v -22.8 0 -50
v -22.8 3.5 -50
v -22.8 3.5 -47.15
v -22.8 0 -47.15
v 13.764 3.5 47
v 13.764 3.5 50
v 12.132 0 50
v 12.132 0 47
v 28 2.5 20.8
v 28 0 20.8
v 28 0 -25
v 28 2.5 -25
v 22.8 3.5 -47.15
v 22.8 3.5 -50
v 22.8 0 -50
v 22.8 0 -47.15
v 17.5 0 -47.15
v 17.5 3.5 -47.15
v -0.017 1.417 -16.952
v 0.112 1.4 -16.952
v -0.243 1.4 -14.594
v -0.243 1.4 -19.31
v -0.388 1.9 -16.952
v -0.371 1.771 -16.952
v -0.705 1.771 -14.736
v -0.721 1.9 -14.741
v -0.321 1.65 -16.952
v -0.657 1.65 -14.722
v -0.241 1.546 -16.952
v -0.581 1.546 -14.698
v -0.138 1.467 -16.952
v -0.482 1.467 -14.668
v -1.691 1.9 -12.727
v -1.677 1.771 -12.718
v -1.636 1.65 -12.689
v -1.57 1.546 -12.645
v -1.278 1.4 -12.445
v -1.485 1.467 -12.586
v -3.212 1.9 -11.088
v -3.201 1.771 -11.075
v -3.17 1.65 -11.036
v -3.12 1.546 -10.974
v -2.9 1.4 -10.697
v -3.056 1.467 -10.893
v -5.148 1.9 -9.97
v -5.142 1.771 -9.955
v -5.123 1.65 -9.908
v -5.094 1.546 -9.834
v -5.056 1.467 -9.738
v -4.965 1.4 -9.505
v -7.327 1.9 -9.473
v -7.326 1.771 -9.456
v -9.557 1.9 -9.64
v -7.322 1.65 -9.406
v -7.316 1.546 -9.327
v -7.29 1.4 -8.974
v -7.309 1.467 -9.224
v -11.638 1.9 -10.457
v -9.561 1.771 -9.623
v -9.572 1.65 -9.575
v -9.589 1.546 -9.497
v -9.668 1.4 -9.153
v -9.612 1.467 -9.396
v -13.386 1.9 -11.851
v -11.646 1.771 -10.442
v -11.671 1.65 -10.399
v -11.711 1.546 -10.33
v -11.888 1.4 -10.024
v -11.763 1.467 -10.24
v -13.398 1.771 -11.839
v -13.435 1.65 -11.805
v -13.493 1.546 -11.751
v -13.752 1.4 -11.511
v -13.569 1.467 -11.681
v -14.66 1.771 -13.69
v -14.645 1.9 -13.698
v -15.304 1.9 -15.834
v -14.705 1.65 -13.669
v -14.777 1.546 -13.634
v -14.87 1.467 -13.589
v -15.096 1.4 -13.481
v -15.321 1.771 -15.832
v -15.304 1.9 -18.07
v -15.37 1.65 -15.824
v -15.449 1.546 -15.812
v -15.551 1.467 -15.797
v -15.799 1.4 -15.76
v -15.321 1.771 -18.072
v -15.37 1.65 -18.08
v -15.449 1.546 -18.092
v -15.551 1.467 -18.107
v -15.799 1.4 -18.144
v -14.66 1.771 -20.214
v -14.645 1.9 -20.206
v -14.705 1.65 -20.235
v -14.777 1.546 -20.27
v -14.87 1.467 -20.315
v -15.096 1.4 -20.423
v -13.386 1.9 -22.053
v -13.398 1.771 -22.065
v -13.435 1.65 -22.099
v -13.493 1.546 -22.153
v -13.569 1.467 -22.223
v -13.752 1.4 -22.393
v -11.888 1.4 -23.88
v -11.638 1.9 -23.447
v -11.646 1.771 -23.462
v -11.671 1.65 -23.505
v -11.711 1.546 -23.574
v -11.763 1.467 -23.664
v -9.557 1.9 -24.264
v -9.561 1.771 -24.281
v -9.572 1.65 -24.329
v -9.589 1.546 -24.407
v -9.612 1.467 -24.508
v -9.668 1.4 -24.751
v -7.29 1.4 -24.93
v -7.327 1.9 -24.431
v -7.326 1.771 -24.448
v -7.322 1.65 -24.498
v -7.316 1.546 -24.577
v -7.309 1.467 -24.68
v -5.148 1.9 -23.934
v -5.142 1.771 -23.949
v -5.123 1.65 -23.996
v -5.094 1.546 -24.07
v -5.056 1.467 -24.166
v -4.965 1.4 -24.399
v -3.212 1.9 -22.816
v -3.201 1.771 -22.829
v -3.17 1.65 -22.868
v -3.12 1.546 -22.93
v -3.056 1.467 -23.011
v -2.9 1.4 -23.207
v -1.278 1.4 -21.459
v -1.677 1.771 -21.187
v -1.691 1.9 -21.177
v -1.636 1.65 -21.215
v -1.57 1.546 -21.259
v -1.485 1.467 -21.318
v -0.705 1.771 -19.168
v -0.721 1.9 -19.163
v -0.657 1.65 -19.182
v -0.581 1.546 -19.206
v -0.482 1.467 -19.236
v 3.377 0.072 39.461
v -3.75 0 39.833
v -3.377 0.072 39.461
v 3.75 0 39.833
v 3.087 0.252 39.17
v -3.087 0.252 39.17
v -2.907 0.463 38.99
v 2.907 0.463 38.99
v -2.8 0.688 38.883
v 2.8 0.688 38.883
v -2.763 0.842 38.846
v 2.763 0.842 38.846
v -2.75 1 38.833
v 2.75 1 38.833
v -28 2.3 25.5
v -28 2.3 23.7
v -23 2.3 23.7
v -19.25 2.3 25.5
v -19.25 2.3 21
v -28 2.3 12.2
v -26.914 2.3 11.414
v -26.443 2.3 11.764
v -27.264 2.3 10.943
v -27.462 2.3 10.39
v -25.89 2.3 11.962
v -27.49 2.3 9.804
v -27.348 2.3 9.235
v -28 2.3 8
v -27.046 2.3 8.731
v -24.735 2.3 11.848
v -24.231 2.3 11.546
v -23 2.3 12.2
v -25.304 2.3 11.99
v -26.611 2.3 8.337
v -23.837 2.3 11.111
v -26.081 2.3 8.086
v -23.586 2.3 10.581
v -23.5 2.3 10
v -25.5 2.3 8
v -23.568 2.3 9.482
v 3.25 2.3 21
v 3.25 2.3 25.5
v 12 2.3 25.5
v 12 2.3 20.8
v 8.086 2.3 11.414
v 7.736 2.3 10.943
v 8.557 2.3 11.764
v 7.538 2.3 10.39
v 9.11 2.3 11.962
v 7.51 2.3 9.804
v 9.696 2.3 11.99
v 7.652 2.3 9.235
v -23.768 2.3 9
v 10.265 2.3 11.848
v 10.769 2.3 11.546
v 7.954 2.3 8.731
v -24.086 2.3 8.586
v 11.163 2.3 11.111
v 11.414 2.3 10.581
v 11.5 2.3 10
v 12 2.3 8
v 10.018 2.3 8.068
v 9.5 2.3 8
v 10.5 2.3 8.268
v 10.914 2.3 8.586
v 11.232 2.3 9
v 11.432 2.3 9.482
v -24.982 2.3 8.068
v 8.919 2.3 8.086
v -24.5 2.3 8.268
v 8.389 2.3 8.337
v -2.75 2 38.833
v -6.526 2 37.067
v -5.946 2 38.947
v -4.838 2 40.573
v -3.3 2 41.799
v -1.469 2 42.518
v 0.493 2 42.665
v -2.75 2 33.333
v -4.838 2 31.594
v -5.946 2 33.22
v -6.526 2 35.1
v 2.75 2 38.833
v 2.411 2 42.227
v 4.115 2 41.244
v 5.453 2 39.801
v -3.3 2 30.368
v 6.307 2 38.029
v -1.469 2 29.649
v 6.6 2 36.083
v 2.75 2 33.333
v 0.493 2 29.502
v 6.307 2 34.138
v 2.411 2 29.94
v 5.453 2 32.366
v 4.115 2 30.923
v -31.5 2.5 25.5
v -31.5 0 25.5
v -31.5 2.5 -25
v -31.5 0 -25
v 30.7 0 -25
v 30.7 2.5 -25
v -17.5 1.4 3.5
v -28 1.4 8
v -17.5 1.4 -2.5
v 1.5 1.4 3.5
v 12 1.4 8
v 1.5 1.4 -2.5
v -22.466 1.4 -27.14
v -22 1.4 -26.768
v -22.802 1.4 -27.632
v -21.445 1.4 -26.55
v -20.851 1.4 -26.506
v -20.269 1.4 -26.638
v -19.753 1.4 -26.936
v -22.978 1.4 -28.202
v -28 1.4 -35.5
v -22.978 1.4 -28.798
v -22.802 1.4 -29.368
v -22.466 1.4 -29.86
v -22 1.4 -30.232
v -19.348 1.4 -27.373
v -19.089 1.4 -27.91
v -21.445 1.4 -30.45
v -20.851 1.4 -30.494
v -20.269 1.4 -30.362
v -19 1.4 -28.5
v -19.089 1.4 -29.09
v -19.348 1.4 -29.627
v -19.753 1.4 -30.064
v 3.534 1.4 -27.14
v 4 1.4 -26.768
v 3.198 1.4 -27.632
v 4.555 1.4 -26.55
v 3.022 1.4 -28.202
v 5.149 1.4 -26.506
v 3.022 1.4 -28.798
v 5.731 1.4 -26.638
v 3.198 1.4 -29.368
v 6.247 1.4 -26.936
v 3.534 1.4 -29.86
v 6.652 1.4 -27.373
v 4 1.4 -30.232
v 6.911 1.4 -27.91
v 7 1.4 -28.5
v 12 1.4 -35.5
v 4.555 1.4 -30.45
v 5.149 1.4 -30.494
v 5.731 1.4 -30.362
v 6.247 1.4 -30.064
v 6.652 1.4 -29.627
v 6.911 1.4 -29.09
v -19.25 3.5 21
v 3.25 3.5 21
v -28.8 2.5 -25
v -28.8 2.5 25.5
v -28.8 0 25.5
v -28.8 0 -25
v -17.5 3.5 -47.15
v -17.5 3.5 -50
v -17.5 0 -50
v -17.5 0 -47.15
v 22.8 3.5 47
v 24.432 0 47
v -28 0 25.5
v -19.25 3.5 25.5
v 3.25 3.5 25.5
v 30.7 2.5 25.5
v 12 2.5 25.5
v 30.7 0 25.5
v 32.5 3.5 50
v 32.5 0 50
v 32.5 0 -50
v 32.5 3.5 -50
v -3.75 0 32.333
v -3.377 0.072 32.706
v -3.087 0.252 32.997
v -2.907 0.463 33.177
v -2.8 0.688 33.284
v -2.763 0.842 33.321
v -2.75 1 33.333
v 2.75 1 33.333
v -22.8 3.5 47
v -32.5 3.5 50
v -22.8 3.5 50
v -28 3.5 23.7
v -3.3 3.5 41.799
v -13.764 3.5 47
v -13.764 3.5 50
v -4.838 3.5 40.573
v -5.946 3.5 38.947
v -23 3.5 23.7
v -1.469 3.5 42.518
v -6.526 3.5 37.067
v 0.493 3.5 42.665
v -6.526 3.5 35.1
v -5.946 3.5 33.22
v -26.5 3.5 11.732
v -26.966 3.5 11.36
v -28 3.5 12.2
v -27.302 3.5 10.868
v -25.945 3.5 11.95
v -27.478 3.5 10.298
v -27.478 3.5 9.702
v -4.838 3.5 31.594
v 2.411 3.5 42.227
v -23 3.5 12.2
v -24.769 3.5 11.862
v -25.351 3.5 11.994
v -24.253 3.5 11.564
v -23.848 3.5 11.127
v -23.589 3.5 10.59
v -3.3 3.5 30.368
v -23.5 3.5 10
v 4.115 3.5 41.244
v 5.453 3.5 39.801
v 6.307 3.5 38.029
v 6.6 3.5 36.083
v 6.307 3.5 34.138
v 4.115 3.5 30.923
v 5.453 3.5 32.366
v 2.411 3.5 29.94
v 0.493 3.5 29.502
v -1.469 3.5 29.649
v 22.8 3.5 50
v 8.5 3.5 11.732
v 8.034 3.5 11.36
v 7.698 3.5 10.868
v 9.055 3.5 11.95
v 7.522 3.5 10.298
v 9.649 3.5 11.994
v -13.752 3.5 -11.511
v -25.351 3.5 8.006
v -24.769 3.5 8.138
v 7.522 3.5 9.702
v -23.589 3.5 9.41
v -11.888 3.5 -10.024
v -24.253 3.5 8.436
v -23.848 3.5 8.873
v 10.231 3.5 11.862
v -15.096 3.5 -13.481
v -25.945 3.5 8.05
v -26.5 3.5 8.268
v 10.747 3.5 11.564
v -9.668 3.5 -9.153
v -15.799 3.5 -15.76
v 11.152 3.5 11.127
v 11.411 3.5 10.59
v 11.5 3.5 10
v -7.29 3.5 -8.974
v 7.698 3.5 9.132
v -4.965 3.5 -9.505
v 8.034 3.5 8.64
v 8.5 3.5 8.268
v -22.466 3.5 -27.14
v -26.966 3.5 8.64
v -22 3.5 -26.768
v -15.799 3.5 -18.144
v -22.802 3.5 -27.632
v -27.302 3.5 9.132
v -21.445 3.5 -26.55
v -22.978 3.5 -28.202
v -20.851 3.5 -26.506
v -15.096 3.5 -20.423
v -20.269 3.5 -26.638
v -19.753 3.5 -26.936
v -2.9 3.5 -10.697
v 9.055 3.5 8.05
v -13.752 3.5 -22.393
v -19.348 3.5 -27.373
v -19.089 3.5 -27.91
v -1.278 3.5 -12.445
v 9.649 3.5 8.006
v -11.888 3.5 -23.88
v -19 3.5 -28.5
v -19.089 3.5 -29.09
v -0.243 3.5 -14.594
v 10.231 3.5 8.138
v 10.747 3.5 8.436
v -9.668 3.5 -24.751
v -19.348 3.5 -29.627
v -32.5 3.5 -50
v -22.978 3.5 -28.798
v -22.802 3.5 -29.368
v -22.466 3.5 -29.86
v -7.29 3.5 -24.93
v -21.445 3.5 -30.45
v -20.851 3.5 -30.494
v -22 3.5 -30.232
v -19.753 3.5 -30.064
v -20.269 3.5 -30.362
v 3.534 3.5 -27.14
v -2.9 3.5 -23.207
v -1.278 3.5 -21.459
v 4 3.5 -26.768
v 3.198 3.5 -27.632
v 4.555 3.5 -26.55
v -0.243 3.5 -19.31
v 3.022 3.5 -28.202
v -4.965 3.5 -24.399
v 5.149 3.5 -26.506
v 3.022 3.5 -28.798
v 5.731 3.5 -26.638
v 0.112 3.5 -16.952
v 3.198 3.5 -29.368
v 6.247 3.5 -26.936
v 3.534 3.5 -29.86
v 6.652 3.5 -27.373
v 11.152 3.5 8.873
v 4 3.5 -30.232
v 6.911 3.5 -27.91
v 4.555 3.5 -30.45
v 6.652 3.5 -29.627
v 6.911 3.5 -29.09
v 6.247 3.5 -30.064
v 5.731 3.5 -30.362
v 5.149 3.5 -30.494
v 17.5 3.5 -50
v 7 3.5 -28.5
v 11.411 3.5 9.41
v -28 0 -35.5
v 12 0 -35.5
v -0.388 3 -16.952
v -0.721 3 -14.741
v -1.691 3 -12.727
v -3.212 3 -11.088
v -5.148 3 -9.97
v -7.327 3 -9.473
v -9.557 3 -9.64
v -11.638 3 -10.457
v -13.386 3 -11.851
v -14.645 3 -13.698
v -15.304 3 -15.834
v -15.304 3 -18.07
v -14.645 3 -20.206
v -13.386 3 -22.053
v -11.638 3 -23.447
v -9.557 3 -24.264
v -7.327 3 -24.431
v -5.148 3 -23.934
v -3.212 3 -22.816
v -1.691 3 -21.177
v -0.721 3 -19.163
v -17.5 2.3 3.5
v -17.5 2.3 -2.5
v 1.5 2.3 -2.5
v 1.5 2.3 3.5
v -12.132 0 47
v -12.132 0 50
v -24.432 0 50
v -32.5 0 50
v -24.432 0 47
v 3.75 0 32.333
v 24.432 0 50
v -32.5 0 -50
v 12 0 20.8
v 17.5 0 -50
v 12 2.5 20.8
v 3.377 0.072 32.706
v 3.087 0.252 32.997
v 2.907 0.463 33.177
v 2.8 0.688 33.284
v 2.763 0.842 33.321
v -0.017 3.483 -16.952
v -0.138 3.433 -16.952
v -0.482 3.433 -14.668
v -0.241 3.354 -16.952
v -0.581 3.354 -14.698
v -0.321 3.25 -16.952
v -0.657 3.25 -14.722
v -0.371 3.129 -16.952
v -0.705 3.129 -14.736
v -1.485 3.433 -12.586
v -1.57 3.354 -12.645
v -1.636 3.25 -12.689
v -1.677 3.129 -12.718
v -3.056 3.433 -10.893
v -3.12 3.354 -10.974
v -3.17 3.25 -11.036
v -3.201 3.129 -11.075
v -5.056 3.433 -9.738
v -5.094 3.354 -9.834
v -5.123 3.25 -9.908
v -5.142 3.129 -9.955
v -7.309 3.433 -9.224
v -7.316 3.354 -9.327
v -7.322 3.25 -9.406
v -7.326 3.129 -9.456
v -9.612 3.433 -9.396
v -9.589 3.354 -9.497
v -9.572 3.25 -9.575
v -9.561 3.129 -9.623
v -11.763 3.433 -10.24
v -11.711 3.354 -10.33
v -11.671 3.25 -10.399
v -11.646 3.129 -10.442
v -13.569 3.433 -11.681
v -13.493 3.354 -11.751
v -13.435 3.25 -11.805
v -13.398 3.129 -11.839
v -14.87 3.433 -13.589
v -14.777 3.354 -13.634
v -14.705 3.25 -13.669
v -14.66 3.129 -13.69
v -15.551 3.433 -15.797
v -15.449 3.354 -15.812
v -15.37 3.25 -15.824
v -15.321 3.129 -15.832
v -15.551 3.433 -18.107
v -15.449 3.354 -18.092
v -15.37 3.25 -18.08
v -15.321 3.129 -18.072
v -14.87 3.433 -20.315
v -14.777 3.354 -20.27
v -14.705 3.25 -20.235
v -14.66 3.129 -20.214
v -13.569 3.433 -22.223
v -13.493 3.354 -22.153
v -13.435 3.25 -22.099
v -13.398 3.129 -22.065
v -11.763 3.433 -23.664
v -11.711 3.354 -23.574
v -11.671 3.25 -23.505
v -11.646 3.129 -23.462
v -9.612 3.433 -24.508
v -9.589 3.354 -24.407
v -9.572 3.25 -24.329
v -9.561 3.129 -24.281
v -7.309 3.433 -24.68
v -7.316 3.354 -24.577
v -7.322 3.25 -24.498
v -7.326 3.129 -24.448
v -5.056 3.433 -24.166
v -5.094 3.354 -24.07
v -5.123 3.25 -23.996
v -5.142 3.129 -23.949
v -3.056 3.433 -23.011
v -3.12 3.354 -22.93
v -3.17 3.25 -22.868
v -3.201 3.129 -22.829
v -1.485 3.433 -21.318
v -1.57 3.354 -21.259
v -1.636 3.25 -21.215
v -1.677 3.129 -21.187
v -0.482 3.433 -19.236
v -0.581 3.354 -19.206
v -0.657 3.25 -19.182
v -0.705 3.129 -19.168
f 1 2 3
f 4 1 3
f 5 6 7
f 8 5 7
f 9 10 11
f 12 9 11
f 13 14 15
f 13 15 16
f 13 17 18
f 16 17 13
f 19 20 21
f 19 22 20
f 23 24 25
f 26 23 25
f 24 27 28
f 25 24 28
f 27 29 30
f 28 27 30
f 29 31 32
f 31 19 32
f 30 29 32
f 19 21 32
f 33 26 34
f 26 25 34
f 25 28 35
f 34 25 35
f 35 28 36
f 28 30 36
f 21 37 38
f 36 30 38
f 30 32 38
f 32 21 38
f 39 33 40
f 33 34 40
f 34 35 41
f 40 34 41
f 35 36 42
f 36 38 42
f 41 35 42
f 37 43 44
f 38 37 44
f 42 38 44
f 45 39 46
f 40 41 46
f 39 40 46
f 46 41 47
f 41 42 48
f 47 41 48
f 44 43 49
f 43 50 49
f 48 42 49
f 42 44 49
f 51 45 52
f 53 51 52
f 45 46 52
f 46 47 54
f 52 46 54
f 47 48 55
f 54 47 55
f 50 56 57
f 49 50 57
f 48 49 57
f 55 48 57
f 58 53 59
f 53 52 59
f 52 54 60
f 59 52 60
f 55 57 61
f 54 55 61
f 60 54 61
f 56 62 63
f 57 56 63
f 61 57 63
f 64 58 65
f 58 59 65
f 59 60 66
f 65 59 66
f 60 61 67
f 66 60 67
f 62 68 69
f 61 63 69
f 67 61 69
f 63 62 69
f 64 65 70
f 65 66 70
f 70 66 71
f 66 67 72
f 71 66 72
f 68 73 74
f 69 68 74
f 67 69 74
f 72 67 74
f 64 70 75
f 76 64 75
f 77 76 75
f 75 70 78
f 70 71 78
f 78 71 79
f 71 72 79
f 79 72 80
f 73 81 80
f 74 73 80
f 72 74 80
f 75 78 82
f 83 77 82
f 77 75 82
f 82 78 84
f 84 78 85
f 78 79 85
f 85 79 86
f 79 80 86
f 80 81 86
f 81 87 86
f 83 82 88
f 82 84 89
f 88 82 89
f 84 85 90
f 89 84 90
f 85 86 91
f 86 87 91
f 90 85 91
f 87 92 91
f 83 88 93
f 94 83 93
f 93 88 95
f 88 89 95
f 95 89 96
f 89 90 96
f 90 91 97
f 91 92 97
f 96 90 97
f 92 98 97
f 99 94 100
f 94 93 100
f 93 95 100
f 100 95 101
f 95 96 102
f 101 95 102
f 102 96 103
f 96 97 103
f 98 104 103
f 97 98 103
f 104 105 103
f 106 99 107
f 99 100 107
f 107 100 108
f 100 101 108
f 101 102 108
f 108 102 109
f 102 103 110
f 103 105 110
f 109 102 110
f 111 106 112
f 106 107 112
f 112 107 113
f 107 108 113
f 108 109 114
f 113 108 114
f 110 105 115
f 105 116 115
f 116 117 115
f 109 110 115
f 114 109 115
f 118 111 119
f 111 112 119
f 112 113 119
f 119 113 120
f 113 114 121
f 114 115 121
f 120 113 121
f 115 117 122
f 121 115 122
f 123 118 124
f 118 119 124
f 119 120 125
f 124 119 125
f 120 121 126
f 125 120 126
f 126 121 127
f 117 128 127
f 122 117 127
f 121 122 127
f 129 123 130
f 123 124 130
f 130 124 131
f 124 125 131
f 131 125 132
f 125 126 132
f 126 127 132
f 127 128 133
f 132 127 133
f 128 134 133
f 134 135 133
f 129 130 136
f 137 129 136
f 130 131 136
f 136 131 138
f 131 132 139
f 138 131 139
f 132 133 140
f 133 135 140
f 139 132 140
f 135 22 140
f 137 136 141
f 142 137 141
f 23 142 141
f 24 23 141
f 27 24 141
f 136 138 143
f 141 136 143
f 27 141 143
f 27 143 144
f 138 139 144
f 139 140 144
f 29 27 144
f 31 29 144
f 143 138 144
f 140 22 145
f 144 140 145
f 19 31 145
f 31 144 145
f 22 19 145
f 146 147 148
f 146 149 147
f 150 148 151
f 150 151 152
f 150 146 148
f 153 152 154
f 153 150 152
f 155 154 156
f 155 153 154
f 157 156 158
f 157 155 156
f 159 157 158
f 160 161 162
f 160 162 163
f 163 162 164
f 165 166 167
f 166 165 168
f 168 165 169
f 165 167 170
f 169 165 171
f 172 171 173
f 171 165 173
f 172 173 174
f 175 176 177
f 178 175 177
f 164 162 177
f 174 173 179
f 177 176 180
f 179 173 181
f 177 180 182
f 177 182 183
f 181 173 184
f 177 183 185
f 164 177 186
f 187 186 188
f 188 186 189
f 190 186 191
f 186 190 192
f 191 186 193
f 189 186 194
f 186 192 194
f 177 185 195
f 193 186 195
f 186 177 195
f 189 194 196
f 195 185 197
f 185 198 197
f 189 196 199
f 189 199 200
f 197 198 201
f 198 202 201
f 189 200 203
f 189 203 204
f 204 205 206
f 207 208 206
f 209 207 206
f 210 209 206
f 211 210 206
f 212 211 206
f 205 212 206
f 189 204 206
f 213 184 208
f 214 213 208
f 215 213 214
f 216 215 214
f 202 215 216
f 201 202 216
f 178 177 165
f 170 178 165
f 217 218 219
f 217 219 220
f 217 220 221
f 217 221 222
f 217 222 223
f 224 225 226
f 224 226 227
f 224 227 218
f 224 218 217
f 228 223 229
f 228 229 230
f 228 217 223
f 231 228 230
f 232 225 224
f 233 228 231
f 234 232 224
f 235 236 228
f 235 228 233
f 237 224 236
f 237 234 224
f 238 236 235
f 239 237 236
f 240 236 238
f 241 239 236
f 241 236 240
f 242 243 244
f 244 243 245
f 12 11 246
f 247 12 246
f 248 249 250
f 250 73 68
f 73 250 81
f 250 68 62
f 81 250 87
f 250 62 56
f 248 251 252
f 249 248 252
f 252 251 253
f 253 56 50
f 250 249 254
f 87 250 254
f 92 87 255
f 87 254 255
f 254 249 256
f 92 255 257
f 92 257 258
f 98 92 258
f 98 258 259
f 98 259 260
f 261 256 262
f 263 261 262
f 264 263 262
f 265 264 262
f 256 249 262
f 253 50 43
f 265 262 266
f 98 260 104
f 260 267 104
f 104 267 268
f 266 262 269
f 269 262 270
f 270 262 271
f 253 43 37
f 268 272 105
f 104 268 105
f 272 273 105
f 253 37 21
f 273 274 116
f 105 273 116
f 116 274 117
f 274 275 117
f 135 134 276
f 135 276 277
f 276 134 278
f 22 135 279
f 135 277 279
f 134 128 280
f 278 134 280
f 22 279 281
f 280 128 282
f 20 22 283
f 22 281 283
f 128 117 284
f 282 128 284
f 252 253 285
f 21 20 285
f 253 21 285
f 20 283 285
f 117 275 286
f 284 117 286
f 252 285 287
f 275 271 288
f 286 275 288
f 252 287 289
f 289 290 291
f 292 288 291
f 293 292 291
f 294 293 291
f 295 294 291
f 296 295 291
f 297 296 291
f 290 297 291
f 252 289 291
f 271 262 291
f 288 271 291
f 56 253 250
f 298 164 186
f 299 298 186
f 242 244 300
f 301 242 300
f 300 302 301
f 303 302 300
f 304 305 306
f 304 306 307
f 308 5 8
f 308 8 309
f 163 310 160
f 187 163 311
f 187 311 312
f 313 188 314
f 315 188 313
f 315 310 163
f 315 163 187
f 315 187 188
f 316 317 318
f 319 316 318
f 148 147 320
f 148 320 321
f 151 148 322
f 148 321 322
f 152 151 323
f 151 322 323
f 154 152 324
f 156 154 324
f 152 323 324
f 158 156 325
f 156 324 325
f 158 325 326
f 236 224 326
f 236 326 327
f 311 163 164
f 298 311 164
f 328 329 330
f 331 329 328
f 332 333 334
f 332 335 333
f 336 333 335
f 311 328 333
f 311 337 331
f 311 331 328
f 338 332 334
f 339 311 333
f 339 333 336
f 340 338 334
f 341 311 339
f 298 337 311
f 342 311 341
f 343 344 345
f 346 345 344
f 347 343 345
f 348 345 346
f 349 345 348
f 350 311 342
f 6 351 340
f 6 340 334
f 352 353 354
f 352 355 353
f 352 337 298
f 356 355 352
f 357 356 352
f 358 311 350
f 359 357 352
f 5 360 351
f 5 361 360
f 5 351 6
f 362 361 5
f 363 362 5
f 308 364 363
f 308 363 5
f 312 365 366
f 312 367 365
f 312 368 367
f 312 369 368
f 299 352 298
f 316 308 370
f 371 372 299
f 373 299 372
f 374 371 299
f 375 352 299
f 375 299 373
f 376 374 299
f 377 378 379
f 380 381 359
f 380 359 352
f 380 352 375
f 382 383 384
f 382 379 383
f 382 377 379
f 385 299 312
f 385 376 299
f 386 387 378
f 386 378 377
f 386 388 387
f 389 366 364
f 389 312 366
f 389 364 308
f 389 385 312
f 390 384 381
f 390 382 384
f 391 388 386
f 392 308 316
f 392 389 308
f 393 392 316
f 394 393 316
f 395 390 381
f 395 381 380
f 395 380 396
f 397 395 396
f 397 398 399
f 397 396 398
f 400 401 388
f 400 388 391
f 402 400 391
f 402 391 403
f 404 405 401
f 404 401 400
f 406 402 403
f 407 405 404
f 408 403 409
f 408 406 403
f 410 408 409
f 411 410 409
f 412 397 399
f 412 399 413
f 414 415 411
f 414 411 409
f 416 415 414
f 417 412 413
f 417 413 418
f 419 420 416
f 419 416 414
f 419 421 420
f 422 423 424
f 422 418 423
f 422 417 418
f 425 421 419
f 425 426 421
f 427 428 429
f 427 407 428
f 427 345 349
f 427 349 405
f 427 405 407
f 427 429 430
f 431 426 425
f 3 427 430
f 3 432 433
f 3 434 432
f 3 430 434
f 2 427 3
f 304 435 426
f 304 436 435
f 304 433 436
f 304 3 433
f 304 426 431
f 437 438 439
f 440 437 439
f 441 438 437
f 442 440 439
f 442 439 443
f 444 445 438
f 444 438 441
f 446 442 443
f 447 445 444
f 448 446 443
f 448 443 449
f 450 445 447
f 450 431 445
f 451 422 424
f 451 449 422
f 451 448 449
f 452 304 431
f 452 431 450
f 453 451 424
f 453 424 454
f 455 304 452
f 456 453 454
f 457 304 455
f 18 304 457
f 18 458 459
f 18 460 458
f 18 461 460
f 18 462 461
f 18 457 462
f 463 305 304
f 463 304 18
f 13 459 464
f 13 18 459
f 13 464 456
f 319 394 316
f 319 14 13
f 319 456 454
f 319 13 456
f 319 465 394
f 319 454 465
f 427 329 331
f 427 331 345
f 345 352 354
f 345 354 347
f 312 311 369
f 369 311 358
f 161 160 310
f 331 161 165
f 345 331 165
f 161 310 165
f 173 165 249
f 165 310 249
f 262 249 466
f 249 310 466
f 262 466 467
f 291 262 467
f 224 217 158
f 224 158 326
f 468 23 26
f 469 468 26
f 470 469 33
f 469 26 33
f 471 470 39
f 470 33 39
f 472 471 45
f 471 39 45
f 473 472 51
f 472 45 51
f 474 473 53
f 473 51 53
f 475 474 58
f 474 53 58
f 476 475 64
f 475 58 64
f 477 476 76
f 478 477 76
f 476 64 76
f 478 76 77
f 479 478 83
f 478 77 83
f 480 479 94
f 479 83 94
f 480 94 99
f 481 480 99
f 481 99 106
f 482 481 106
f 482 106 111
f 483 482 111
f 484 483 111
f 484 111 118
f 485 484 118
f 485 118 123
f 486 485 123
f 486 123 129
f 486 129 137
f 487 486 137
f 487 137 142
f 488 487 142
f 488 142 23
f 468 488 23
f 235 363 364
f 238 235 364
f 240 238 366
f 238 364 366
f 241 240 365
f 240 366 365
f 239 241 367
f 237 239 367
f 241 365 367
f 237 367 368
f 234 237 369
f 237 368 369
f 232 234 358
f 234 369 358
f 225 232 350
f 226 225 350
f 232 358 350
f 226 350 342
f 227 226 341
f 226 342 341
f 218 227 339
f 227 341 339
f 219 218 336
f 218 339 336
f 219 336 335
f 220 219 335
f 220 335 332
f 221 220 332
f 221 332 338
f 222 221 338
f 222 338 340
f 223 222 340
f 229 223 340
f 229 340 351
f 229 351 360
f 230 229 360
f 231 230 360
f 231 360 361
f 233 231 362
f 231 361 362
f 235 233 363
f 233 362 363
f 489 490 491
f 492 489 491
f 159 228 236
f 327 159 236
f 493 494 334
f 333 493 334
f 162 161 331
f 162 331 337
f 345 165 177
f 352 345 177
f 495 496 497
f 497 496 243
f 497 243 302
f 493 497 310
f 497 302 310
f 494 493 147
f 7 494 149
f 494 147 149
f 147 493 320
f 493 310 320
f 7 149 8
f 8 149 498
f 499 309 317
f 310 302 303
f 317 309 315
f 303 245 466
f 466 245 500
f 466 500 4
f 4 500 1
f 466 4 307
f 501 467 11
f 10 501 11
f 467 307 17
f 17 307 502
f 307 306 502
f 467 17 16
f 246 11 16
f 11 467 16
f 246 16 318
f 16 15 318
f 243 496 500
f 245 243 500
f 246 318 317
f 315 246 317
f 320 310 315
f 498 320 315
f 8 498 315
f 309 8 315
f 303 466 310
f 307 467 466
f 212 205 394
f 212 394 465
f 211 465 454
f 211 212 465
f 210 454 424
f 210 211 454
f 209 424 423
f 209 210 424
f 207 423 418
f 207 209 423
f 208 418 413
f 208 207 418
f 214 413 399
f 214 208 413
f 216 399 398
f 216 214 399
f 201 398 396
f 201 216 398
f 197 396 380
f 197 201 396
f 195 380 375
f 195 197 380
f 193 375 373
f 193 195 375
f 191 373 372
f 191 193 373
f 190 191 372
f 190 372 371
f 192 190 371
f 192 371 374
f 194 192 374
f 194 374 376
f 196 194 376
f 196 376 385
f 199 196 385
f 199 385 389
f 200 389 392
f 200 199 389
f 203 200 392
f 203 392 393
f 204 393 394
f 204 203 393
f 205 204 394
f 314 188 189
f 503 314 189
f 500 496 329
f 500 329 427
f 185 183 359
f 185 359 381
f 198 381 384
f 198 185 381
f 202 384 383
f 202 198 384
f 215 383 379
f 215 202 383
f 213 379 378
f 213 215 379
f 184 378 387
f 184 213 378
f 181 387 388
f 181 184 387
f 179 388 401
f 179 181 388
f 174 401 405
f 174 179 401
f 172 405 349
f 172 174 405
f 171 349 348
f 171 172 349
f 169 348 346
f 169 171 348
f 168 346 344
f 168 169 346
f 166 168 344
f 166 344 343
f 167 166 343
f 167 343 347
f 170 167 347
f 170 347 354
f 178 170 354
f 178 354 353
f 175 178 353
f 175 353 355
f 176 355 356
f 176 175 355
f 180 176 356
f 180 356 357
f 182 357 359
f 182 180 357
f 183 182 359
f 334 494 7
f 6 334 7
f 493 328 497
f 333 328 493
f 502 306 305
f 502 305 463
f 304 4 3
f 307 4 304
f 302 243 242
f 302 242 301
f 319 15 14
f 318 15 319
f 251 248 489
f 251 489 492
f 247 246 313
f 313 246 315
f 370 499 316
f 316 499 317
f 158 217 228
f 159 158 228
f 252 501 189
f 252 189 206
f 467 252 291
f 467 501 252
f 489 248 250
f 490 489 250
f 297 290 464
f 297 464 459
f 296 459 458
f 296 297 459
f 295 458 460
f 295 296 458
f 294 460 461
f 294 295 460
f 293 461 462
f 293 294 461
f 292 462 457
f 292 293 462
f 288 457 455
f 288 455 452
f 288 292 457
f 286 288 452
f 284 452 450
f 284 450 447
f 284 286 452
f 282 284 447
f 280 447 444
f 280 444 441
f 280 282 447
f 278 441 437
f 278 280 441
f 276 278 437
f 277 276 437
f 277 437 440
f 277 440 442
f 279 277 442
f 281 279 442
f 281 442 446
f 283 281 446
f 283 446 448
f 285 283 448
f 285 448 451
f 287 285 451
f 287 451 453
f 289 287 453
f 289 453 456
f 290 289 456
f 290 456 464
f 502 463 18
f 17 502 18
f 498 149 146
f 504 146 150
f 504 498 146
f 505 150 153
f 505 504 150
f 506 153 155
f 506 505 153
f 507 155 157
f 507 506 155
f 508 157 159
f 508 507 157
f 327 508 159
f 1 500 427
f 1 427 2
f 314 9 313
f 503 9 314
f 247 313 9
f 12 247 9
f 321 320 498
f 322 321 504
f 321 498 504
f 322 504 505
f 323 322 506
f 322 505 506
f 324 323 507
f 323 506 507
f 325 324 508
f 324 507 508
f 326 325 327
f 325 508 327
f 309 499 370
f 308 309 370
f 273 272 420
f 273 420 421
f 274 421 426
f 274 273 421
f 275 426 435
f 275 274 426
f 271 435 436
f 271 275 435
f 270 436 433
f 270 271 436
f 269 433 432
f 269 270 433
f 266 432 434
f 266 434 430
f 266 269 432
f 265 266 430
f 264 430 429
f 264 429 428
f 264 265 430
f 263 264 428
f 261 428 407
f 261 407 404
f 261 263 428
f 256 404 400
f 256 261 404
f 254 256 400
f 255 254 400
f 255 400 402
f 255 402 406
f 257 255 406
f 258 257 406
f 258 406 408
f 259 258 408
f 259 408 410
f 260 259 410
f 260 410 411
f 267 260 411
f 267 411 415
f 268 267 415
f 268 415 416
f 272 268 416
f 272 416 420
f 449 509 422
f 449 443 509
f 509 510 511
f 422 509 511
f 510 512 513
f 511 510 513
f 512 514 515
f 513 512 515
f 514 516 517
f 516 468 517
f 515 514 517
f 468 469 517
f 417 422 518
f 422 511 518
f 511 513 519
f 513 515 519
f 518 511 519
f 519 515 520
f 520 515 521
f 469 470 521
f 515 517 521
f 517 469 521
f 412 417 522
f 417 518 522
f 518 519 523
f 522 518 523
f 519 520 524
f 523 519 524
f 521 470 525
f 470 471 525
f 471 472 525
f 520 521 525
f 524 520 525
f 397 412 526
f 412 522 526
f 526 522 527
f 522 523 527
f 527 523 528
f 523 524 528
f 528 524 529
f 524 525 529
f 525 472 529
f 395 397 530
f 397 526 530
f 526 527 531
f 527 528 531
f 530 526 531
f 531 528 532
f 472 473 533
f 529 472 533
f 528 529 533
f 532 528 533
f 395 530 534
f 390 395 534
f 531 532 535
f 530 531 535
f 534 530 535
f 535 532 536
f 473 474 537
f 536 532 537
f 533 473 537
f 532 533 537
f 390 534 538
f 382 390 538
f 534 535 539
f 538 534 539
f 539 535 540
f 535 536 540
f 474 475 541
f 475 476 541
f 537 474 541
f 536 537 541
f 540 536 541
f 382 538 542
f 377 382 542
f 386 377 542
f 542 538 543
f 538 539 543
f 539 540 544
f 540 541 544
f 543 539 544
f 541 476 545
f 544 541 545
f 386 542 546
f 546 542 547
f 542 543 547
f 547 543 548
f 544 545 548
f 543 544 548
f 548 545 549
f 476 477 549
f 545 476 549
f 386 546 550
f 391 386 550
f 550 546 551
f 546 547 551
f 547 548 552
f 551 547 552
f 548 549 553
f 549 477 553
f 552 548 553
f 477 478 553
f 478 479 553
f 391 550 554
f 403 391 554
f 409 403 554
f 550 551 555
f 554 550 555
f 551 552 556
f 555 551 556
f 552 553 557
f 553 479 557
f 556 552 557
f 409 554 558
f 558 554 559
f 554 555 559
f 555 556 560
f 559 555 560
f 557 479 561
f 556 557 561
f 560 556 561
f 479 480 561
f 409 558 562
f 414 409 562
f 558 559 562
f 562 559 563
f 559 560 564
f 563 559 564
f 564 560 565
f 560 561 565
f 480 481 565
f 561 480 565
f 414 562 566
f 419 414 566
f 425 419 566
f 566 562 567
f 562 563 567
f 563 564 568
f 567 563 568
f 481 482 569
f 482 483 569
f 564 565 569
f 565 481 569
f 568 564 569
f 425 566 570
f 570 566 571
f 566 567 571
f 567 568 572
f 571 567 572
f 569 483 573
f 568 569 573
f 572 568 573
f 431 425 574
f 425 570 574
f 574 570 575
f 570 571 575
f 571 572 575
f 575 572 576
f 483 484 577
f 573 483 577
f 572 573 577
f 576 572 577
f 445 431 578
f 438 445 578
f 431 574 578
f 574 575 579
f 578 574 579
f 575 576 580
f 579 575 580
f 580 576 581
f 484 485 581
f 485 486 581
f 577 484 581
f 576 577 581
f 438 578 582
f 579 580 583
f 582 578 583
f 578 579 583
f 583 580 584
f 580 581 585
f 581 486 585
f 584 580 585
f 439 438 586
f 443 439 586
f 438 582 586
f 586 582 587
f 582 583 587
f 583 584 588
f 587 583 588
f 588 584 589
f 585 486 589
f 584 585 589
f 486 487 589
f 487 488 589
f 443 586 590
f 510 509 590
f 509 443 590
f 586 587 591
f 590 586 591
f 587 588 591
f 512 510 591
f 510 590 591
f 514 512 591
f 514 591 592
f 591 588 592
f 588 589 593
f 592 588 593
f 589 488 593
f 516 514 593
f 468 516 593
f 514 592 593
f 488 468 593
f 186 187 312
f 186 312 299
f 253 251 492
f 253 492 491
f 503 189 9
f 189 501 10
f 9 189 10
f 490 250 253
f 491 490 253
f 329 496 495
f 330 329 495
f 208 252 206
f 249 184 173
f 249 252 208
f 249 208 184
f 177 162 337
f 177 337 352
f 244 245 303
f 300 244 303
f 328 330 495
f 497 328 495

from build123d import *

# Parameters (mm, degrees)
SKETCH1_W                = 65
SKETCH1_H                = 100
BOSS_EXTRUDE1_DEPTH      = 3.5
SKETCH2_W                = 40
SKETCH2_H                = 61
CUT_EXTRUDE1_DEPTH       = 1.4
SKETCH3_R                = 2
CUT_EXTRUDE3_DEPTH       = 3.5
SKETCH4_R                = 2
CUT_EXTRUDE5_DEPTH       = 3.5
SKETCH6_R                = 2
CUT_EXTRUDE6_DEPTH       = 3.5
SKETCH7_R                = 2
CUT_EXTRUDE7_DEPTH       = 3.5
SKETCH9_W                = 19
SKETCH9_H                = 6
CUT_EXTRUDE9_DEPTH       = 2.3
SKETCH10_W               = 22.5
SKETCH10_H               = 4.5
CUT_EXTRUDE10_DEPTH      = 3.5
CUT_EXTRUDE11_DEPTH      = 2.3
CUT_EXTRUDE15_DEPTH      = 2.5
SKETCH18_W               = 2.7
SKETCH18_H               = 50.5
CUT_EXTRUDE18_DEPTH      = 2.5
SKETCH8_W                = 5
SKETCH8_H                = 11.5
CUT_EXTRUDE25_DEPTH      = 3.5
SKETCH20_R               = 7.5
CUT_EXTRUDE27_DEPTH      = 2.4
CUT_EXTRUDE27_DEPTH_BACK = 3.1
SKETCH21_W               = 5.3
SKETCH21_H               = 2.85
CUT_EXTRUDE28_DEPTH      = 3.5
CUT_EXTRUDE30_DEPTH      = 3
FILLET2_R                = 0.5
SKETCH27_R               = 6.6
CUT_EXTRUDE32_DEPTH      = 1.5
SKETCH28_W               = 5.5
SKETCH28_H               = 5.5
CUT_EXTRUDE33_DEPTH      = 3
FILLET4_R                = 1


with BuildPart() as part:
    # Sketch1 → Boss-Extrude1 (new body)
    with BuildSketch(Plane(origin=(0, 0, 0), x_dir=(1, 0, 0), z_dir=(0, 1, 0))):
        Rectangle(SKETCH1_W, SKETCH1_H)
    extrude(amount=BOSS_EXTRUDE1_DEPTH)

    # Sketch2 → Cut-Extrude1 (cut)
    with BuildSketch(Plane(origin=(0, 0, 0), x_dir=(1, 0, 0), z_dir=(0, 1, 0))):
        with Locations((-8, 5)):
            Rectangle(SKETCH2_W, SKETCH2_H)
    extrude(amount=CUT_EXTRUDE1_DEPTH, mode=Mode.SUBTRACT)

    # Sketch3 → Cut-Extrude3 (cut)
    with BuildSketch(Plane(origin=(0, 0, 0), x_dir=(1, 0, 0), z_dir=(0, 1, 0))):
        with Locations((-21, 28.5)):
            Circle(SKETCH3_R)
    extrude(amount=CUT_EXTRUDE3_DEPTH, mode=Mode.SUBTRACT)

    # Sketch4 → Cut-Extrude5 (cut)
    with BuildSketch(Plane(origin=(0, 0, 0), x_dir=(1, 0, 0), z_dir=(0, 1, 0))):
        with Locations((5, 28.5)):
            Circle(SKETCH4_R)
    extrude(amount=CUT_EXTRUDE5_DEPTH, mode=Mode.SUBTRACT)

    # Sketch6 → Cut-Extrude6 (cut)
    with BuildSketch(Plane(origin=(0, 0, 0), x_dir=(1, 0, 0), z_dir=(0, 1, 0))):
        with Locations((-25.5, -10)):
            Circle(SKETCH6_R)
    extrude(amount=CUT_EXTRUDE6_DEPTH, mode=Mode.SUBTRACT)

    # Sketch7 → Cut-Extrude7 (cut)
    with BuildSketch(Plane(origin=(0, 0, 0), x_dir=(1, 0, 0), z_dir=(0, 1, 0))):
        with Locations((9.5, -10)):
            Circle(SKETCH7_R)
    extrude(amount=CUT_EXTRUDE7_DEPTH, mode=Mode.SUBTRACT)

    # Sketch9 → Cut-Extrude9 (cut)
    with BuildSketch(Plane(origin=(0, 0, 0), x_dir=(1, 0, 0), z_dir=(0, 1, 0))):
        with Locations((-8, -0.5)):
            Rectangle(SKETCH9_W, SKETCH9_H)
    extrude(amount=CUT_EXTRUDE9_DEPTH, mode=Mode.SUBTRACT)

    # Sketch10 → Cut-Extrude10 (cut)
    with BuildSketch(Plane(origin=(0, 0, 0), x_dir=(1, 0, 0), z_dir=(0, 1, 0))):
        with Locations((-8, -23.25)):
            Rectangle(SKETCH10_W, SKETCH10_H)
    extrude(amount=CUT_EXTRUDE10_DEPTH, mode=Mode.SUBTRACT)

    # Sketch11 → Cut-Extrude11 (cut)
    with BuildSketch(Plane(origin=(0, 0, 0), x_dir=(1, 0, 0), z_dir=(0, 1, 0))):
        Polygon((-28, -25.5), (3.25, -25.5), (12, -25.5), (12, -21), (12, -8), (-28, -8), align=None)
    extrude(amount=CUT_EXTRUDE11_DEPTH, mode=Mode.SUBTRACT)

    # Sketch12 → Cut-Extrude15 (cut)
    with BuildSketch(Plane(origin=(0, 0, 0), x_dir=(1, 0, 0), z_dir=(0, 1, 0))):
        Polygon((28, -20.8), (28, 25), (30.7, 25), (30.7, -25.5), (12, -25.5), (12, -20.8), align=None)
    extrude(amount=CUT_EXTRUDE15_DEPTH, mode=Mode.SUBTRACT)

    # Sketch18 → Cut-Extrude18 (cut)
    with BuildSketch(Plane(origin=(0, 0, 0), x_dir=(1, 0, 0), z_dir=(0, 1, 0))):
        with Locations((-30.15, -0.25)):
            Rectangle(SKETCH18_W, SKETCH18_H)
    extrude(amount=CUT_EXTRUDE18_DEPTH, mode=Mode.SUBTRACT)

    # Sketch8 → Cut-Extrude25 (cut)
    with BuildSketch(Plane(origin=(0, 0, 0), x_dir=(1, 0, 0), z_dir=(0, 1, 0))):
        with Locations((-25.5, -17.95)):
            Rectangle(SKETCH8_W, SKETCH8_H)
    extrude(amount=CUT_EXTRUDE25_DEPTH, mode=Mode.SUBTRACT)

    # Sketch20 → Cut-Extrude27 (cut, two sides)
    with BuildSketch(Plane.XZ.offset(-1.4)) as cut_extrude27_sk:
        with Locations((-7.887877966, -16.952018436)):
            Circle(SKETCH20_R)
    extrude(amount=CUT_EXTRUDE27_DEPTH, mode=Mode.SUBTRACT)
    extrude(cut_extrude27_sk.sketch, amount=-CUT_EXTRUDE27_DEPTH_BACK, mode=Mode.SUBTRACT)

    # Sketch21 → Cut-Extrude28 (cut)
    with BuildSketch(Plane.XZ):
        with Locations((-20.15, -48.575)):
            Rectangle(SKETCH21_W, SKETCH21_H)
        with Locations((20.15, -48.575)):
            Rectangle(SKETCH21_W, SKETCH21_H)
    extrude(amount=-CUT_EXTRUDE28_DEPTH, mode=Mode.SUBTRACT)

    # Sketch25 → Cut-Extrude30 (cut)
    with BuildSketch(Plane.XY.offset(50)):
        Polygon((22.8, 3.5), (13.764153607, 3.5), (12.132076804, 0), (24.432076804, 0), align=None)
        Polygon((-22.8, 3.5), (-24.432076804, 0), (-12.132076804, 0), (-13.764153607, 3.5), align=None)
    extrude(amount=-CUT_EXTRUDE30_DEPTH, mode=Mode.SUBTRACT)

    # Fillet2
    fillet2_edges = [part.edges().sort_by_distance(p)[0] for p in [
        (-15.387877966, 1.4, -16.952018436),
        (-15.387877966, 3.5, -16.952018436),
    ]]
    fillet(fillet2_edges, radius=FILLET2_R)

    # Sketch27 → Cut-Extrude32 (cut)
    with BuildSketch(Plane(origin=(0, 3.5, 0), x_dir=(1, 0, 0), z_dir=(0, 1, 0))):
        with Locations((0, -36.08346839)):
            Circle(SKETCH27_R)
    extrude(amount=-CUT_EXTRUDE32_DEPTH, mode=Mode.SUBTRACT)

    # Sketch28 → Cut-Extrude33 (cut, through all)
    with BuildSketch(Plane(origin=(0, 2, 0), x_dir=(1, 0, 0), z_dir=(0, 1, 0))):
        with Locations((0, -36.08346839)):
            Rectangle(SKETCH28_W, SKETCH28_H)
    extrude(amount=-CUT_EXTRUDE33_DEPTH, mode=Mode.SUBTRACT)

    # Fillet4
    fillet4_edges = [part.edges().sort_by_distance(p)[0] for p in [
        (2.75, 0, 36.08346839),
        (0, 0, 38.83346839),
        (-2.75, 0, 36.08346839),
        (0, 0, 33.33346839),
    ]]
    fillet(fillet4_edges, radius=FILLET4_R)


solid = part.part
